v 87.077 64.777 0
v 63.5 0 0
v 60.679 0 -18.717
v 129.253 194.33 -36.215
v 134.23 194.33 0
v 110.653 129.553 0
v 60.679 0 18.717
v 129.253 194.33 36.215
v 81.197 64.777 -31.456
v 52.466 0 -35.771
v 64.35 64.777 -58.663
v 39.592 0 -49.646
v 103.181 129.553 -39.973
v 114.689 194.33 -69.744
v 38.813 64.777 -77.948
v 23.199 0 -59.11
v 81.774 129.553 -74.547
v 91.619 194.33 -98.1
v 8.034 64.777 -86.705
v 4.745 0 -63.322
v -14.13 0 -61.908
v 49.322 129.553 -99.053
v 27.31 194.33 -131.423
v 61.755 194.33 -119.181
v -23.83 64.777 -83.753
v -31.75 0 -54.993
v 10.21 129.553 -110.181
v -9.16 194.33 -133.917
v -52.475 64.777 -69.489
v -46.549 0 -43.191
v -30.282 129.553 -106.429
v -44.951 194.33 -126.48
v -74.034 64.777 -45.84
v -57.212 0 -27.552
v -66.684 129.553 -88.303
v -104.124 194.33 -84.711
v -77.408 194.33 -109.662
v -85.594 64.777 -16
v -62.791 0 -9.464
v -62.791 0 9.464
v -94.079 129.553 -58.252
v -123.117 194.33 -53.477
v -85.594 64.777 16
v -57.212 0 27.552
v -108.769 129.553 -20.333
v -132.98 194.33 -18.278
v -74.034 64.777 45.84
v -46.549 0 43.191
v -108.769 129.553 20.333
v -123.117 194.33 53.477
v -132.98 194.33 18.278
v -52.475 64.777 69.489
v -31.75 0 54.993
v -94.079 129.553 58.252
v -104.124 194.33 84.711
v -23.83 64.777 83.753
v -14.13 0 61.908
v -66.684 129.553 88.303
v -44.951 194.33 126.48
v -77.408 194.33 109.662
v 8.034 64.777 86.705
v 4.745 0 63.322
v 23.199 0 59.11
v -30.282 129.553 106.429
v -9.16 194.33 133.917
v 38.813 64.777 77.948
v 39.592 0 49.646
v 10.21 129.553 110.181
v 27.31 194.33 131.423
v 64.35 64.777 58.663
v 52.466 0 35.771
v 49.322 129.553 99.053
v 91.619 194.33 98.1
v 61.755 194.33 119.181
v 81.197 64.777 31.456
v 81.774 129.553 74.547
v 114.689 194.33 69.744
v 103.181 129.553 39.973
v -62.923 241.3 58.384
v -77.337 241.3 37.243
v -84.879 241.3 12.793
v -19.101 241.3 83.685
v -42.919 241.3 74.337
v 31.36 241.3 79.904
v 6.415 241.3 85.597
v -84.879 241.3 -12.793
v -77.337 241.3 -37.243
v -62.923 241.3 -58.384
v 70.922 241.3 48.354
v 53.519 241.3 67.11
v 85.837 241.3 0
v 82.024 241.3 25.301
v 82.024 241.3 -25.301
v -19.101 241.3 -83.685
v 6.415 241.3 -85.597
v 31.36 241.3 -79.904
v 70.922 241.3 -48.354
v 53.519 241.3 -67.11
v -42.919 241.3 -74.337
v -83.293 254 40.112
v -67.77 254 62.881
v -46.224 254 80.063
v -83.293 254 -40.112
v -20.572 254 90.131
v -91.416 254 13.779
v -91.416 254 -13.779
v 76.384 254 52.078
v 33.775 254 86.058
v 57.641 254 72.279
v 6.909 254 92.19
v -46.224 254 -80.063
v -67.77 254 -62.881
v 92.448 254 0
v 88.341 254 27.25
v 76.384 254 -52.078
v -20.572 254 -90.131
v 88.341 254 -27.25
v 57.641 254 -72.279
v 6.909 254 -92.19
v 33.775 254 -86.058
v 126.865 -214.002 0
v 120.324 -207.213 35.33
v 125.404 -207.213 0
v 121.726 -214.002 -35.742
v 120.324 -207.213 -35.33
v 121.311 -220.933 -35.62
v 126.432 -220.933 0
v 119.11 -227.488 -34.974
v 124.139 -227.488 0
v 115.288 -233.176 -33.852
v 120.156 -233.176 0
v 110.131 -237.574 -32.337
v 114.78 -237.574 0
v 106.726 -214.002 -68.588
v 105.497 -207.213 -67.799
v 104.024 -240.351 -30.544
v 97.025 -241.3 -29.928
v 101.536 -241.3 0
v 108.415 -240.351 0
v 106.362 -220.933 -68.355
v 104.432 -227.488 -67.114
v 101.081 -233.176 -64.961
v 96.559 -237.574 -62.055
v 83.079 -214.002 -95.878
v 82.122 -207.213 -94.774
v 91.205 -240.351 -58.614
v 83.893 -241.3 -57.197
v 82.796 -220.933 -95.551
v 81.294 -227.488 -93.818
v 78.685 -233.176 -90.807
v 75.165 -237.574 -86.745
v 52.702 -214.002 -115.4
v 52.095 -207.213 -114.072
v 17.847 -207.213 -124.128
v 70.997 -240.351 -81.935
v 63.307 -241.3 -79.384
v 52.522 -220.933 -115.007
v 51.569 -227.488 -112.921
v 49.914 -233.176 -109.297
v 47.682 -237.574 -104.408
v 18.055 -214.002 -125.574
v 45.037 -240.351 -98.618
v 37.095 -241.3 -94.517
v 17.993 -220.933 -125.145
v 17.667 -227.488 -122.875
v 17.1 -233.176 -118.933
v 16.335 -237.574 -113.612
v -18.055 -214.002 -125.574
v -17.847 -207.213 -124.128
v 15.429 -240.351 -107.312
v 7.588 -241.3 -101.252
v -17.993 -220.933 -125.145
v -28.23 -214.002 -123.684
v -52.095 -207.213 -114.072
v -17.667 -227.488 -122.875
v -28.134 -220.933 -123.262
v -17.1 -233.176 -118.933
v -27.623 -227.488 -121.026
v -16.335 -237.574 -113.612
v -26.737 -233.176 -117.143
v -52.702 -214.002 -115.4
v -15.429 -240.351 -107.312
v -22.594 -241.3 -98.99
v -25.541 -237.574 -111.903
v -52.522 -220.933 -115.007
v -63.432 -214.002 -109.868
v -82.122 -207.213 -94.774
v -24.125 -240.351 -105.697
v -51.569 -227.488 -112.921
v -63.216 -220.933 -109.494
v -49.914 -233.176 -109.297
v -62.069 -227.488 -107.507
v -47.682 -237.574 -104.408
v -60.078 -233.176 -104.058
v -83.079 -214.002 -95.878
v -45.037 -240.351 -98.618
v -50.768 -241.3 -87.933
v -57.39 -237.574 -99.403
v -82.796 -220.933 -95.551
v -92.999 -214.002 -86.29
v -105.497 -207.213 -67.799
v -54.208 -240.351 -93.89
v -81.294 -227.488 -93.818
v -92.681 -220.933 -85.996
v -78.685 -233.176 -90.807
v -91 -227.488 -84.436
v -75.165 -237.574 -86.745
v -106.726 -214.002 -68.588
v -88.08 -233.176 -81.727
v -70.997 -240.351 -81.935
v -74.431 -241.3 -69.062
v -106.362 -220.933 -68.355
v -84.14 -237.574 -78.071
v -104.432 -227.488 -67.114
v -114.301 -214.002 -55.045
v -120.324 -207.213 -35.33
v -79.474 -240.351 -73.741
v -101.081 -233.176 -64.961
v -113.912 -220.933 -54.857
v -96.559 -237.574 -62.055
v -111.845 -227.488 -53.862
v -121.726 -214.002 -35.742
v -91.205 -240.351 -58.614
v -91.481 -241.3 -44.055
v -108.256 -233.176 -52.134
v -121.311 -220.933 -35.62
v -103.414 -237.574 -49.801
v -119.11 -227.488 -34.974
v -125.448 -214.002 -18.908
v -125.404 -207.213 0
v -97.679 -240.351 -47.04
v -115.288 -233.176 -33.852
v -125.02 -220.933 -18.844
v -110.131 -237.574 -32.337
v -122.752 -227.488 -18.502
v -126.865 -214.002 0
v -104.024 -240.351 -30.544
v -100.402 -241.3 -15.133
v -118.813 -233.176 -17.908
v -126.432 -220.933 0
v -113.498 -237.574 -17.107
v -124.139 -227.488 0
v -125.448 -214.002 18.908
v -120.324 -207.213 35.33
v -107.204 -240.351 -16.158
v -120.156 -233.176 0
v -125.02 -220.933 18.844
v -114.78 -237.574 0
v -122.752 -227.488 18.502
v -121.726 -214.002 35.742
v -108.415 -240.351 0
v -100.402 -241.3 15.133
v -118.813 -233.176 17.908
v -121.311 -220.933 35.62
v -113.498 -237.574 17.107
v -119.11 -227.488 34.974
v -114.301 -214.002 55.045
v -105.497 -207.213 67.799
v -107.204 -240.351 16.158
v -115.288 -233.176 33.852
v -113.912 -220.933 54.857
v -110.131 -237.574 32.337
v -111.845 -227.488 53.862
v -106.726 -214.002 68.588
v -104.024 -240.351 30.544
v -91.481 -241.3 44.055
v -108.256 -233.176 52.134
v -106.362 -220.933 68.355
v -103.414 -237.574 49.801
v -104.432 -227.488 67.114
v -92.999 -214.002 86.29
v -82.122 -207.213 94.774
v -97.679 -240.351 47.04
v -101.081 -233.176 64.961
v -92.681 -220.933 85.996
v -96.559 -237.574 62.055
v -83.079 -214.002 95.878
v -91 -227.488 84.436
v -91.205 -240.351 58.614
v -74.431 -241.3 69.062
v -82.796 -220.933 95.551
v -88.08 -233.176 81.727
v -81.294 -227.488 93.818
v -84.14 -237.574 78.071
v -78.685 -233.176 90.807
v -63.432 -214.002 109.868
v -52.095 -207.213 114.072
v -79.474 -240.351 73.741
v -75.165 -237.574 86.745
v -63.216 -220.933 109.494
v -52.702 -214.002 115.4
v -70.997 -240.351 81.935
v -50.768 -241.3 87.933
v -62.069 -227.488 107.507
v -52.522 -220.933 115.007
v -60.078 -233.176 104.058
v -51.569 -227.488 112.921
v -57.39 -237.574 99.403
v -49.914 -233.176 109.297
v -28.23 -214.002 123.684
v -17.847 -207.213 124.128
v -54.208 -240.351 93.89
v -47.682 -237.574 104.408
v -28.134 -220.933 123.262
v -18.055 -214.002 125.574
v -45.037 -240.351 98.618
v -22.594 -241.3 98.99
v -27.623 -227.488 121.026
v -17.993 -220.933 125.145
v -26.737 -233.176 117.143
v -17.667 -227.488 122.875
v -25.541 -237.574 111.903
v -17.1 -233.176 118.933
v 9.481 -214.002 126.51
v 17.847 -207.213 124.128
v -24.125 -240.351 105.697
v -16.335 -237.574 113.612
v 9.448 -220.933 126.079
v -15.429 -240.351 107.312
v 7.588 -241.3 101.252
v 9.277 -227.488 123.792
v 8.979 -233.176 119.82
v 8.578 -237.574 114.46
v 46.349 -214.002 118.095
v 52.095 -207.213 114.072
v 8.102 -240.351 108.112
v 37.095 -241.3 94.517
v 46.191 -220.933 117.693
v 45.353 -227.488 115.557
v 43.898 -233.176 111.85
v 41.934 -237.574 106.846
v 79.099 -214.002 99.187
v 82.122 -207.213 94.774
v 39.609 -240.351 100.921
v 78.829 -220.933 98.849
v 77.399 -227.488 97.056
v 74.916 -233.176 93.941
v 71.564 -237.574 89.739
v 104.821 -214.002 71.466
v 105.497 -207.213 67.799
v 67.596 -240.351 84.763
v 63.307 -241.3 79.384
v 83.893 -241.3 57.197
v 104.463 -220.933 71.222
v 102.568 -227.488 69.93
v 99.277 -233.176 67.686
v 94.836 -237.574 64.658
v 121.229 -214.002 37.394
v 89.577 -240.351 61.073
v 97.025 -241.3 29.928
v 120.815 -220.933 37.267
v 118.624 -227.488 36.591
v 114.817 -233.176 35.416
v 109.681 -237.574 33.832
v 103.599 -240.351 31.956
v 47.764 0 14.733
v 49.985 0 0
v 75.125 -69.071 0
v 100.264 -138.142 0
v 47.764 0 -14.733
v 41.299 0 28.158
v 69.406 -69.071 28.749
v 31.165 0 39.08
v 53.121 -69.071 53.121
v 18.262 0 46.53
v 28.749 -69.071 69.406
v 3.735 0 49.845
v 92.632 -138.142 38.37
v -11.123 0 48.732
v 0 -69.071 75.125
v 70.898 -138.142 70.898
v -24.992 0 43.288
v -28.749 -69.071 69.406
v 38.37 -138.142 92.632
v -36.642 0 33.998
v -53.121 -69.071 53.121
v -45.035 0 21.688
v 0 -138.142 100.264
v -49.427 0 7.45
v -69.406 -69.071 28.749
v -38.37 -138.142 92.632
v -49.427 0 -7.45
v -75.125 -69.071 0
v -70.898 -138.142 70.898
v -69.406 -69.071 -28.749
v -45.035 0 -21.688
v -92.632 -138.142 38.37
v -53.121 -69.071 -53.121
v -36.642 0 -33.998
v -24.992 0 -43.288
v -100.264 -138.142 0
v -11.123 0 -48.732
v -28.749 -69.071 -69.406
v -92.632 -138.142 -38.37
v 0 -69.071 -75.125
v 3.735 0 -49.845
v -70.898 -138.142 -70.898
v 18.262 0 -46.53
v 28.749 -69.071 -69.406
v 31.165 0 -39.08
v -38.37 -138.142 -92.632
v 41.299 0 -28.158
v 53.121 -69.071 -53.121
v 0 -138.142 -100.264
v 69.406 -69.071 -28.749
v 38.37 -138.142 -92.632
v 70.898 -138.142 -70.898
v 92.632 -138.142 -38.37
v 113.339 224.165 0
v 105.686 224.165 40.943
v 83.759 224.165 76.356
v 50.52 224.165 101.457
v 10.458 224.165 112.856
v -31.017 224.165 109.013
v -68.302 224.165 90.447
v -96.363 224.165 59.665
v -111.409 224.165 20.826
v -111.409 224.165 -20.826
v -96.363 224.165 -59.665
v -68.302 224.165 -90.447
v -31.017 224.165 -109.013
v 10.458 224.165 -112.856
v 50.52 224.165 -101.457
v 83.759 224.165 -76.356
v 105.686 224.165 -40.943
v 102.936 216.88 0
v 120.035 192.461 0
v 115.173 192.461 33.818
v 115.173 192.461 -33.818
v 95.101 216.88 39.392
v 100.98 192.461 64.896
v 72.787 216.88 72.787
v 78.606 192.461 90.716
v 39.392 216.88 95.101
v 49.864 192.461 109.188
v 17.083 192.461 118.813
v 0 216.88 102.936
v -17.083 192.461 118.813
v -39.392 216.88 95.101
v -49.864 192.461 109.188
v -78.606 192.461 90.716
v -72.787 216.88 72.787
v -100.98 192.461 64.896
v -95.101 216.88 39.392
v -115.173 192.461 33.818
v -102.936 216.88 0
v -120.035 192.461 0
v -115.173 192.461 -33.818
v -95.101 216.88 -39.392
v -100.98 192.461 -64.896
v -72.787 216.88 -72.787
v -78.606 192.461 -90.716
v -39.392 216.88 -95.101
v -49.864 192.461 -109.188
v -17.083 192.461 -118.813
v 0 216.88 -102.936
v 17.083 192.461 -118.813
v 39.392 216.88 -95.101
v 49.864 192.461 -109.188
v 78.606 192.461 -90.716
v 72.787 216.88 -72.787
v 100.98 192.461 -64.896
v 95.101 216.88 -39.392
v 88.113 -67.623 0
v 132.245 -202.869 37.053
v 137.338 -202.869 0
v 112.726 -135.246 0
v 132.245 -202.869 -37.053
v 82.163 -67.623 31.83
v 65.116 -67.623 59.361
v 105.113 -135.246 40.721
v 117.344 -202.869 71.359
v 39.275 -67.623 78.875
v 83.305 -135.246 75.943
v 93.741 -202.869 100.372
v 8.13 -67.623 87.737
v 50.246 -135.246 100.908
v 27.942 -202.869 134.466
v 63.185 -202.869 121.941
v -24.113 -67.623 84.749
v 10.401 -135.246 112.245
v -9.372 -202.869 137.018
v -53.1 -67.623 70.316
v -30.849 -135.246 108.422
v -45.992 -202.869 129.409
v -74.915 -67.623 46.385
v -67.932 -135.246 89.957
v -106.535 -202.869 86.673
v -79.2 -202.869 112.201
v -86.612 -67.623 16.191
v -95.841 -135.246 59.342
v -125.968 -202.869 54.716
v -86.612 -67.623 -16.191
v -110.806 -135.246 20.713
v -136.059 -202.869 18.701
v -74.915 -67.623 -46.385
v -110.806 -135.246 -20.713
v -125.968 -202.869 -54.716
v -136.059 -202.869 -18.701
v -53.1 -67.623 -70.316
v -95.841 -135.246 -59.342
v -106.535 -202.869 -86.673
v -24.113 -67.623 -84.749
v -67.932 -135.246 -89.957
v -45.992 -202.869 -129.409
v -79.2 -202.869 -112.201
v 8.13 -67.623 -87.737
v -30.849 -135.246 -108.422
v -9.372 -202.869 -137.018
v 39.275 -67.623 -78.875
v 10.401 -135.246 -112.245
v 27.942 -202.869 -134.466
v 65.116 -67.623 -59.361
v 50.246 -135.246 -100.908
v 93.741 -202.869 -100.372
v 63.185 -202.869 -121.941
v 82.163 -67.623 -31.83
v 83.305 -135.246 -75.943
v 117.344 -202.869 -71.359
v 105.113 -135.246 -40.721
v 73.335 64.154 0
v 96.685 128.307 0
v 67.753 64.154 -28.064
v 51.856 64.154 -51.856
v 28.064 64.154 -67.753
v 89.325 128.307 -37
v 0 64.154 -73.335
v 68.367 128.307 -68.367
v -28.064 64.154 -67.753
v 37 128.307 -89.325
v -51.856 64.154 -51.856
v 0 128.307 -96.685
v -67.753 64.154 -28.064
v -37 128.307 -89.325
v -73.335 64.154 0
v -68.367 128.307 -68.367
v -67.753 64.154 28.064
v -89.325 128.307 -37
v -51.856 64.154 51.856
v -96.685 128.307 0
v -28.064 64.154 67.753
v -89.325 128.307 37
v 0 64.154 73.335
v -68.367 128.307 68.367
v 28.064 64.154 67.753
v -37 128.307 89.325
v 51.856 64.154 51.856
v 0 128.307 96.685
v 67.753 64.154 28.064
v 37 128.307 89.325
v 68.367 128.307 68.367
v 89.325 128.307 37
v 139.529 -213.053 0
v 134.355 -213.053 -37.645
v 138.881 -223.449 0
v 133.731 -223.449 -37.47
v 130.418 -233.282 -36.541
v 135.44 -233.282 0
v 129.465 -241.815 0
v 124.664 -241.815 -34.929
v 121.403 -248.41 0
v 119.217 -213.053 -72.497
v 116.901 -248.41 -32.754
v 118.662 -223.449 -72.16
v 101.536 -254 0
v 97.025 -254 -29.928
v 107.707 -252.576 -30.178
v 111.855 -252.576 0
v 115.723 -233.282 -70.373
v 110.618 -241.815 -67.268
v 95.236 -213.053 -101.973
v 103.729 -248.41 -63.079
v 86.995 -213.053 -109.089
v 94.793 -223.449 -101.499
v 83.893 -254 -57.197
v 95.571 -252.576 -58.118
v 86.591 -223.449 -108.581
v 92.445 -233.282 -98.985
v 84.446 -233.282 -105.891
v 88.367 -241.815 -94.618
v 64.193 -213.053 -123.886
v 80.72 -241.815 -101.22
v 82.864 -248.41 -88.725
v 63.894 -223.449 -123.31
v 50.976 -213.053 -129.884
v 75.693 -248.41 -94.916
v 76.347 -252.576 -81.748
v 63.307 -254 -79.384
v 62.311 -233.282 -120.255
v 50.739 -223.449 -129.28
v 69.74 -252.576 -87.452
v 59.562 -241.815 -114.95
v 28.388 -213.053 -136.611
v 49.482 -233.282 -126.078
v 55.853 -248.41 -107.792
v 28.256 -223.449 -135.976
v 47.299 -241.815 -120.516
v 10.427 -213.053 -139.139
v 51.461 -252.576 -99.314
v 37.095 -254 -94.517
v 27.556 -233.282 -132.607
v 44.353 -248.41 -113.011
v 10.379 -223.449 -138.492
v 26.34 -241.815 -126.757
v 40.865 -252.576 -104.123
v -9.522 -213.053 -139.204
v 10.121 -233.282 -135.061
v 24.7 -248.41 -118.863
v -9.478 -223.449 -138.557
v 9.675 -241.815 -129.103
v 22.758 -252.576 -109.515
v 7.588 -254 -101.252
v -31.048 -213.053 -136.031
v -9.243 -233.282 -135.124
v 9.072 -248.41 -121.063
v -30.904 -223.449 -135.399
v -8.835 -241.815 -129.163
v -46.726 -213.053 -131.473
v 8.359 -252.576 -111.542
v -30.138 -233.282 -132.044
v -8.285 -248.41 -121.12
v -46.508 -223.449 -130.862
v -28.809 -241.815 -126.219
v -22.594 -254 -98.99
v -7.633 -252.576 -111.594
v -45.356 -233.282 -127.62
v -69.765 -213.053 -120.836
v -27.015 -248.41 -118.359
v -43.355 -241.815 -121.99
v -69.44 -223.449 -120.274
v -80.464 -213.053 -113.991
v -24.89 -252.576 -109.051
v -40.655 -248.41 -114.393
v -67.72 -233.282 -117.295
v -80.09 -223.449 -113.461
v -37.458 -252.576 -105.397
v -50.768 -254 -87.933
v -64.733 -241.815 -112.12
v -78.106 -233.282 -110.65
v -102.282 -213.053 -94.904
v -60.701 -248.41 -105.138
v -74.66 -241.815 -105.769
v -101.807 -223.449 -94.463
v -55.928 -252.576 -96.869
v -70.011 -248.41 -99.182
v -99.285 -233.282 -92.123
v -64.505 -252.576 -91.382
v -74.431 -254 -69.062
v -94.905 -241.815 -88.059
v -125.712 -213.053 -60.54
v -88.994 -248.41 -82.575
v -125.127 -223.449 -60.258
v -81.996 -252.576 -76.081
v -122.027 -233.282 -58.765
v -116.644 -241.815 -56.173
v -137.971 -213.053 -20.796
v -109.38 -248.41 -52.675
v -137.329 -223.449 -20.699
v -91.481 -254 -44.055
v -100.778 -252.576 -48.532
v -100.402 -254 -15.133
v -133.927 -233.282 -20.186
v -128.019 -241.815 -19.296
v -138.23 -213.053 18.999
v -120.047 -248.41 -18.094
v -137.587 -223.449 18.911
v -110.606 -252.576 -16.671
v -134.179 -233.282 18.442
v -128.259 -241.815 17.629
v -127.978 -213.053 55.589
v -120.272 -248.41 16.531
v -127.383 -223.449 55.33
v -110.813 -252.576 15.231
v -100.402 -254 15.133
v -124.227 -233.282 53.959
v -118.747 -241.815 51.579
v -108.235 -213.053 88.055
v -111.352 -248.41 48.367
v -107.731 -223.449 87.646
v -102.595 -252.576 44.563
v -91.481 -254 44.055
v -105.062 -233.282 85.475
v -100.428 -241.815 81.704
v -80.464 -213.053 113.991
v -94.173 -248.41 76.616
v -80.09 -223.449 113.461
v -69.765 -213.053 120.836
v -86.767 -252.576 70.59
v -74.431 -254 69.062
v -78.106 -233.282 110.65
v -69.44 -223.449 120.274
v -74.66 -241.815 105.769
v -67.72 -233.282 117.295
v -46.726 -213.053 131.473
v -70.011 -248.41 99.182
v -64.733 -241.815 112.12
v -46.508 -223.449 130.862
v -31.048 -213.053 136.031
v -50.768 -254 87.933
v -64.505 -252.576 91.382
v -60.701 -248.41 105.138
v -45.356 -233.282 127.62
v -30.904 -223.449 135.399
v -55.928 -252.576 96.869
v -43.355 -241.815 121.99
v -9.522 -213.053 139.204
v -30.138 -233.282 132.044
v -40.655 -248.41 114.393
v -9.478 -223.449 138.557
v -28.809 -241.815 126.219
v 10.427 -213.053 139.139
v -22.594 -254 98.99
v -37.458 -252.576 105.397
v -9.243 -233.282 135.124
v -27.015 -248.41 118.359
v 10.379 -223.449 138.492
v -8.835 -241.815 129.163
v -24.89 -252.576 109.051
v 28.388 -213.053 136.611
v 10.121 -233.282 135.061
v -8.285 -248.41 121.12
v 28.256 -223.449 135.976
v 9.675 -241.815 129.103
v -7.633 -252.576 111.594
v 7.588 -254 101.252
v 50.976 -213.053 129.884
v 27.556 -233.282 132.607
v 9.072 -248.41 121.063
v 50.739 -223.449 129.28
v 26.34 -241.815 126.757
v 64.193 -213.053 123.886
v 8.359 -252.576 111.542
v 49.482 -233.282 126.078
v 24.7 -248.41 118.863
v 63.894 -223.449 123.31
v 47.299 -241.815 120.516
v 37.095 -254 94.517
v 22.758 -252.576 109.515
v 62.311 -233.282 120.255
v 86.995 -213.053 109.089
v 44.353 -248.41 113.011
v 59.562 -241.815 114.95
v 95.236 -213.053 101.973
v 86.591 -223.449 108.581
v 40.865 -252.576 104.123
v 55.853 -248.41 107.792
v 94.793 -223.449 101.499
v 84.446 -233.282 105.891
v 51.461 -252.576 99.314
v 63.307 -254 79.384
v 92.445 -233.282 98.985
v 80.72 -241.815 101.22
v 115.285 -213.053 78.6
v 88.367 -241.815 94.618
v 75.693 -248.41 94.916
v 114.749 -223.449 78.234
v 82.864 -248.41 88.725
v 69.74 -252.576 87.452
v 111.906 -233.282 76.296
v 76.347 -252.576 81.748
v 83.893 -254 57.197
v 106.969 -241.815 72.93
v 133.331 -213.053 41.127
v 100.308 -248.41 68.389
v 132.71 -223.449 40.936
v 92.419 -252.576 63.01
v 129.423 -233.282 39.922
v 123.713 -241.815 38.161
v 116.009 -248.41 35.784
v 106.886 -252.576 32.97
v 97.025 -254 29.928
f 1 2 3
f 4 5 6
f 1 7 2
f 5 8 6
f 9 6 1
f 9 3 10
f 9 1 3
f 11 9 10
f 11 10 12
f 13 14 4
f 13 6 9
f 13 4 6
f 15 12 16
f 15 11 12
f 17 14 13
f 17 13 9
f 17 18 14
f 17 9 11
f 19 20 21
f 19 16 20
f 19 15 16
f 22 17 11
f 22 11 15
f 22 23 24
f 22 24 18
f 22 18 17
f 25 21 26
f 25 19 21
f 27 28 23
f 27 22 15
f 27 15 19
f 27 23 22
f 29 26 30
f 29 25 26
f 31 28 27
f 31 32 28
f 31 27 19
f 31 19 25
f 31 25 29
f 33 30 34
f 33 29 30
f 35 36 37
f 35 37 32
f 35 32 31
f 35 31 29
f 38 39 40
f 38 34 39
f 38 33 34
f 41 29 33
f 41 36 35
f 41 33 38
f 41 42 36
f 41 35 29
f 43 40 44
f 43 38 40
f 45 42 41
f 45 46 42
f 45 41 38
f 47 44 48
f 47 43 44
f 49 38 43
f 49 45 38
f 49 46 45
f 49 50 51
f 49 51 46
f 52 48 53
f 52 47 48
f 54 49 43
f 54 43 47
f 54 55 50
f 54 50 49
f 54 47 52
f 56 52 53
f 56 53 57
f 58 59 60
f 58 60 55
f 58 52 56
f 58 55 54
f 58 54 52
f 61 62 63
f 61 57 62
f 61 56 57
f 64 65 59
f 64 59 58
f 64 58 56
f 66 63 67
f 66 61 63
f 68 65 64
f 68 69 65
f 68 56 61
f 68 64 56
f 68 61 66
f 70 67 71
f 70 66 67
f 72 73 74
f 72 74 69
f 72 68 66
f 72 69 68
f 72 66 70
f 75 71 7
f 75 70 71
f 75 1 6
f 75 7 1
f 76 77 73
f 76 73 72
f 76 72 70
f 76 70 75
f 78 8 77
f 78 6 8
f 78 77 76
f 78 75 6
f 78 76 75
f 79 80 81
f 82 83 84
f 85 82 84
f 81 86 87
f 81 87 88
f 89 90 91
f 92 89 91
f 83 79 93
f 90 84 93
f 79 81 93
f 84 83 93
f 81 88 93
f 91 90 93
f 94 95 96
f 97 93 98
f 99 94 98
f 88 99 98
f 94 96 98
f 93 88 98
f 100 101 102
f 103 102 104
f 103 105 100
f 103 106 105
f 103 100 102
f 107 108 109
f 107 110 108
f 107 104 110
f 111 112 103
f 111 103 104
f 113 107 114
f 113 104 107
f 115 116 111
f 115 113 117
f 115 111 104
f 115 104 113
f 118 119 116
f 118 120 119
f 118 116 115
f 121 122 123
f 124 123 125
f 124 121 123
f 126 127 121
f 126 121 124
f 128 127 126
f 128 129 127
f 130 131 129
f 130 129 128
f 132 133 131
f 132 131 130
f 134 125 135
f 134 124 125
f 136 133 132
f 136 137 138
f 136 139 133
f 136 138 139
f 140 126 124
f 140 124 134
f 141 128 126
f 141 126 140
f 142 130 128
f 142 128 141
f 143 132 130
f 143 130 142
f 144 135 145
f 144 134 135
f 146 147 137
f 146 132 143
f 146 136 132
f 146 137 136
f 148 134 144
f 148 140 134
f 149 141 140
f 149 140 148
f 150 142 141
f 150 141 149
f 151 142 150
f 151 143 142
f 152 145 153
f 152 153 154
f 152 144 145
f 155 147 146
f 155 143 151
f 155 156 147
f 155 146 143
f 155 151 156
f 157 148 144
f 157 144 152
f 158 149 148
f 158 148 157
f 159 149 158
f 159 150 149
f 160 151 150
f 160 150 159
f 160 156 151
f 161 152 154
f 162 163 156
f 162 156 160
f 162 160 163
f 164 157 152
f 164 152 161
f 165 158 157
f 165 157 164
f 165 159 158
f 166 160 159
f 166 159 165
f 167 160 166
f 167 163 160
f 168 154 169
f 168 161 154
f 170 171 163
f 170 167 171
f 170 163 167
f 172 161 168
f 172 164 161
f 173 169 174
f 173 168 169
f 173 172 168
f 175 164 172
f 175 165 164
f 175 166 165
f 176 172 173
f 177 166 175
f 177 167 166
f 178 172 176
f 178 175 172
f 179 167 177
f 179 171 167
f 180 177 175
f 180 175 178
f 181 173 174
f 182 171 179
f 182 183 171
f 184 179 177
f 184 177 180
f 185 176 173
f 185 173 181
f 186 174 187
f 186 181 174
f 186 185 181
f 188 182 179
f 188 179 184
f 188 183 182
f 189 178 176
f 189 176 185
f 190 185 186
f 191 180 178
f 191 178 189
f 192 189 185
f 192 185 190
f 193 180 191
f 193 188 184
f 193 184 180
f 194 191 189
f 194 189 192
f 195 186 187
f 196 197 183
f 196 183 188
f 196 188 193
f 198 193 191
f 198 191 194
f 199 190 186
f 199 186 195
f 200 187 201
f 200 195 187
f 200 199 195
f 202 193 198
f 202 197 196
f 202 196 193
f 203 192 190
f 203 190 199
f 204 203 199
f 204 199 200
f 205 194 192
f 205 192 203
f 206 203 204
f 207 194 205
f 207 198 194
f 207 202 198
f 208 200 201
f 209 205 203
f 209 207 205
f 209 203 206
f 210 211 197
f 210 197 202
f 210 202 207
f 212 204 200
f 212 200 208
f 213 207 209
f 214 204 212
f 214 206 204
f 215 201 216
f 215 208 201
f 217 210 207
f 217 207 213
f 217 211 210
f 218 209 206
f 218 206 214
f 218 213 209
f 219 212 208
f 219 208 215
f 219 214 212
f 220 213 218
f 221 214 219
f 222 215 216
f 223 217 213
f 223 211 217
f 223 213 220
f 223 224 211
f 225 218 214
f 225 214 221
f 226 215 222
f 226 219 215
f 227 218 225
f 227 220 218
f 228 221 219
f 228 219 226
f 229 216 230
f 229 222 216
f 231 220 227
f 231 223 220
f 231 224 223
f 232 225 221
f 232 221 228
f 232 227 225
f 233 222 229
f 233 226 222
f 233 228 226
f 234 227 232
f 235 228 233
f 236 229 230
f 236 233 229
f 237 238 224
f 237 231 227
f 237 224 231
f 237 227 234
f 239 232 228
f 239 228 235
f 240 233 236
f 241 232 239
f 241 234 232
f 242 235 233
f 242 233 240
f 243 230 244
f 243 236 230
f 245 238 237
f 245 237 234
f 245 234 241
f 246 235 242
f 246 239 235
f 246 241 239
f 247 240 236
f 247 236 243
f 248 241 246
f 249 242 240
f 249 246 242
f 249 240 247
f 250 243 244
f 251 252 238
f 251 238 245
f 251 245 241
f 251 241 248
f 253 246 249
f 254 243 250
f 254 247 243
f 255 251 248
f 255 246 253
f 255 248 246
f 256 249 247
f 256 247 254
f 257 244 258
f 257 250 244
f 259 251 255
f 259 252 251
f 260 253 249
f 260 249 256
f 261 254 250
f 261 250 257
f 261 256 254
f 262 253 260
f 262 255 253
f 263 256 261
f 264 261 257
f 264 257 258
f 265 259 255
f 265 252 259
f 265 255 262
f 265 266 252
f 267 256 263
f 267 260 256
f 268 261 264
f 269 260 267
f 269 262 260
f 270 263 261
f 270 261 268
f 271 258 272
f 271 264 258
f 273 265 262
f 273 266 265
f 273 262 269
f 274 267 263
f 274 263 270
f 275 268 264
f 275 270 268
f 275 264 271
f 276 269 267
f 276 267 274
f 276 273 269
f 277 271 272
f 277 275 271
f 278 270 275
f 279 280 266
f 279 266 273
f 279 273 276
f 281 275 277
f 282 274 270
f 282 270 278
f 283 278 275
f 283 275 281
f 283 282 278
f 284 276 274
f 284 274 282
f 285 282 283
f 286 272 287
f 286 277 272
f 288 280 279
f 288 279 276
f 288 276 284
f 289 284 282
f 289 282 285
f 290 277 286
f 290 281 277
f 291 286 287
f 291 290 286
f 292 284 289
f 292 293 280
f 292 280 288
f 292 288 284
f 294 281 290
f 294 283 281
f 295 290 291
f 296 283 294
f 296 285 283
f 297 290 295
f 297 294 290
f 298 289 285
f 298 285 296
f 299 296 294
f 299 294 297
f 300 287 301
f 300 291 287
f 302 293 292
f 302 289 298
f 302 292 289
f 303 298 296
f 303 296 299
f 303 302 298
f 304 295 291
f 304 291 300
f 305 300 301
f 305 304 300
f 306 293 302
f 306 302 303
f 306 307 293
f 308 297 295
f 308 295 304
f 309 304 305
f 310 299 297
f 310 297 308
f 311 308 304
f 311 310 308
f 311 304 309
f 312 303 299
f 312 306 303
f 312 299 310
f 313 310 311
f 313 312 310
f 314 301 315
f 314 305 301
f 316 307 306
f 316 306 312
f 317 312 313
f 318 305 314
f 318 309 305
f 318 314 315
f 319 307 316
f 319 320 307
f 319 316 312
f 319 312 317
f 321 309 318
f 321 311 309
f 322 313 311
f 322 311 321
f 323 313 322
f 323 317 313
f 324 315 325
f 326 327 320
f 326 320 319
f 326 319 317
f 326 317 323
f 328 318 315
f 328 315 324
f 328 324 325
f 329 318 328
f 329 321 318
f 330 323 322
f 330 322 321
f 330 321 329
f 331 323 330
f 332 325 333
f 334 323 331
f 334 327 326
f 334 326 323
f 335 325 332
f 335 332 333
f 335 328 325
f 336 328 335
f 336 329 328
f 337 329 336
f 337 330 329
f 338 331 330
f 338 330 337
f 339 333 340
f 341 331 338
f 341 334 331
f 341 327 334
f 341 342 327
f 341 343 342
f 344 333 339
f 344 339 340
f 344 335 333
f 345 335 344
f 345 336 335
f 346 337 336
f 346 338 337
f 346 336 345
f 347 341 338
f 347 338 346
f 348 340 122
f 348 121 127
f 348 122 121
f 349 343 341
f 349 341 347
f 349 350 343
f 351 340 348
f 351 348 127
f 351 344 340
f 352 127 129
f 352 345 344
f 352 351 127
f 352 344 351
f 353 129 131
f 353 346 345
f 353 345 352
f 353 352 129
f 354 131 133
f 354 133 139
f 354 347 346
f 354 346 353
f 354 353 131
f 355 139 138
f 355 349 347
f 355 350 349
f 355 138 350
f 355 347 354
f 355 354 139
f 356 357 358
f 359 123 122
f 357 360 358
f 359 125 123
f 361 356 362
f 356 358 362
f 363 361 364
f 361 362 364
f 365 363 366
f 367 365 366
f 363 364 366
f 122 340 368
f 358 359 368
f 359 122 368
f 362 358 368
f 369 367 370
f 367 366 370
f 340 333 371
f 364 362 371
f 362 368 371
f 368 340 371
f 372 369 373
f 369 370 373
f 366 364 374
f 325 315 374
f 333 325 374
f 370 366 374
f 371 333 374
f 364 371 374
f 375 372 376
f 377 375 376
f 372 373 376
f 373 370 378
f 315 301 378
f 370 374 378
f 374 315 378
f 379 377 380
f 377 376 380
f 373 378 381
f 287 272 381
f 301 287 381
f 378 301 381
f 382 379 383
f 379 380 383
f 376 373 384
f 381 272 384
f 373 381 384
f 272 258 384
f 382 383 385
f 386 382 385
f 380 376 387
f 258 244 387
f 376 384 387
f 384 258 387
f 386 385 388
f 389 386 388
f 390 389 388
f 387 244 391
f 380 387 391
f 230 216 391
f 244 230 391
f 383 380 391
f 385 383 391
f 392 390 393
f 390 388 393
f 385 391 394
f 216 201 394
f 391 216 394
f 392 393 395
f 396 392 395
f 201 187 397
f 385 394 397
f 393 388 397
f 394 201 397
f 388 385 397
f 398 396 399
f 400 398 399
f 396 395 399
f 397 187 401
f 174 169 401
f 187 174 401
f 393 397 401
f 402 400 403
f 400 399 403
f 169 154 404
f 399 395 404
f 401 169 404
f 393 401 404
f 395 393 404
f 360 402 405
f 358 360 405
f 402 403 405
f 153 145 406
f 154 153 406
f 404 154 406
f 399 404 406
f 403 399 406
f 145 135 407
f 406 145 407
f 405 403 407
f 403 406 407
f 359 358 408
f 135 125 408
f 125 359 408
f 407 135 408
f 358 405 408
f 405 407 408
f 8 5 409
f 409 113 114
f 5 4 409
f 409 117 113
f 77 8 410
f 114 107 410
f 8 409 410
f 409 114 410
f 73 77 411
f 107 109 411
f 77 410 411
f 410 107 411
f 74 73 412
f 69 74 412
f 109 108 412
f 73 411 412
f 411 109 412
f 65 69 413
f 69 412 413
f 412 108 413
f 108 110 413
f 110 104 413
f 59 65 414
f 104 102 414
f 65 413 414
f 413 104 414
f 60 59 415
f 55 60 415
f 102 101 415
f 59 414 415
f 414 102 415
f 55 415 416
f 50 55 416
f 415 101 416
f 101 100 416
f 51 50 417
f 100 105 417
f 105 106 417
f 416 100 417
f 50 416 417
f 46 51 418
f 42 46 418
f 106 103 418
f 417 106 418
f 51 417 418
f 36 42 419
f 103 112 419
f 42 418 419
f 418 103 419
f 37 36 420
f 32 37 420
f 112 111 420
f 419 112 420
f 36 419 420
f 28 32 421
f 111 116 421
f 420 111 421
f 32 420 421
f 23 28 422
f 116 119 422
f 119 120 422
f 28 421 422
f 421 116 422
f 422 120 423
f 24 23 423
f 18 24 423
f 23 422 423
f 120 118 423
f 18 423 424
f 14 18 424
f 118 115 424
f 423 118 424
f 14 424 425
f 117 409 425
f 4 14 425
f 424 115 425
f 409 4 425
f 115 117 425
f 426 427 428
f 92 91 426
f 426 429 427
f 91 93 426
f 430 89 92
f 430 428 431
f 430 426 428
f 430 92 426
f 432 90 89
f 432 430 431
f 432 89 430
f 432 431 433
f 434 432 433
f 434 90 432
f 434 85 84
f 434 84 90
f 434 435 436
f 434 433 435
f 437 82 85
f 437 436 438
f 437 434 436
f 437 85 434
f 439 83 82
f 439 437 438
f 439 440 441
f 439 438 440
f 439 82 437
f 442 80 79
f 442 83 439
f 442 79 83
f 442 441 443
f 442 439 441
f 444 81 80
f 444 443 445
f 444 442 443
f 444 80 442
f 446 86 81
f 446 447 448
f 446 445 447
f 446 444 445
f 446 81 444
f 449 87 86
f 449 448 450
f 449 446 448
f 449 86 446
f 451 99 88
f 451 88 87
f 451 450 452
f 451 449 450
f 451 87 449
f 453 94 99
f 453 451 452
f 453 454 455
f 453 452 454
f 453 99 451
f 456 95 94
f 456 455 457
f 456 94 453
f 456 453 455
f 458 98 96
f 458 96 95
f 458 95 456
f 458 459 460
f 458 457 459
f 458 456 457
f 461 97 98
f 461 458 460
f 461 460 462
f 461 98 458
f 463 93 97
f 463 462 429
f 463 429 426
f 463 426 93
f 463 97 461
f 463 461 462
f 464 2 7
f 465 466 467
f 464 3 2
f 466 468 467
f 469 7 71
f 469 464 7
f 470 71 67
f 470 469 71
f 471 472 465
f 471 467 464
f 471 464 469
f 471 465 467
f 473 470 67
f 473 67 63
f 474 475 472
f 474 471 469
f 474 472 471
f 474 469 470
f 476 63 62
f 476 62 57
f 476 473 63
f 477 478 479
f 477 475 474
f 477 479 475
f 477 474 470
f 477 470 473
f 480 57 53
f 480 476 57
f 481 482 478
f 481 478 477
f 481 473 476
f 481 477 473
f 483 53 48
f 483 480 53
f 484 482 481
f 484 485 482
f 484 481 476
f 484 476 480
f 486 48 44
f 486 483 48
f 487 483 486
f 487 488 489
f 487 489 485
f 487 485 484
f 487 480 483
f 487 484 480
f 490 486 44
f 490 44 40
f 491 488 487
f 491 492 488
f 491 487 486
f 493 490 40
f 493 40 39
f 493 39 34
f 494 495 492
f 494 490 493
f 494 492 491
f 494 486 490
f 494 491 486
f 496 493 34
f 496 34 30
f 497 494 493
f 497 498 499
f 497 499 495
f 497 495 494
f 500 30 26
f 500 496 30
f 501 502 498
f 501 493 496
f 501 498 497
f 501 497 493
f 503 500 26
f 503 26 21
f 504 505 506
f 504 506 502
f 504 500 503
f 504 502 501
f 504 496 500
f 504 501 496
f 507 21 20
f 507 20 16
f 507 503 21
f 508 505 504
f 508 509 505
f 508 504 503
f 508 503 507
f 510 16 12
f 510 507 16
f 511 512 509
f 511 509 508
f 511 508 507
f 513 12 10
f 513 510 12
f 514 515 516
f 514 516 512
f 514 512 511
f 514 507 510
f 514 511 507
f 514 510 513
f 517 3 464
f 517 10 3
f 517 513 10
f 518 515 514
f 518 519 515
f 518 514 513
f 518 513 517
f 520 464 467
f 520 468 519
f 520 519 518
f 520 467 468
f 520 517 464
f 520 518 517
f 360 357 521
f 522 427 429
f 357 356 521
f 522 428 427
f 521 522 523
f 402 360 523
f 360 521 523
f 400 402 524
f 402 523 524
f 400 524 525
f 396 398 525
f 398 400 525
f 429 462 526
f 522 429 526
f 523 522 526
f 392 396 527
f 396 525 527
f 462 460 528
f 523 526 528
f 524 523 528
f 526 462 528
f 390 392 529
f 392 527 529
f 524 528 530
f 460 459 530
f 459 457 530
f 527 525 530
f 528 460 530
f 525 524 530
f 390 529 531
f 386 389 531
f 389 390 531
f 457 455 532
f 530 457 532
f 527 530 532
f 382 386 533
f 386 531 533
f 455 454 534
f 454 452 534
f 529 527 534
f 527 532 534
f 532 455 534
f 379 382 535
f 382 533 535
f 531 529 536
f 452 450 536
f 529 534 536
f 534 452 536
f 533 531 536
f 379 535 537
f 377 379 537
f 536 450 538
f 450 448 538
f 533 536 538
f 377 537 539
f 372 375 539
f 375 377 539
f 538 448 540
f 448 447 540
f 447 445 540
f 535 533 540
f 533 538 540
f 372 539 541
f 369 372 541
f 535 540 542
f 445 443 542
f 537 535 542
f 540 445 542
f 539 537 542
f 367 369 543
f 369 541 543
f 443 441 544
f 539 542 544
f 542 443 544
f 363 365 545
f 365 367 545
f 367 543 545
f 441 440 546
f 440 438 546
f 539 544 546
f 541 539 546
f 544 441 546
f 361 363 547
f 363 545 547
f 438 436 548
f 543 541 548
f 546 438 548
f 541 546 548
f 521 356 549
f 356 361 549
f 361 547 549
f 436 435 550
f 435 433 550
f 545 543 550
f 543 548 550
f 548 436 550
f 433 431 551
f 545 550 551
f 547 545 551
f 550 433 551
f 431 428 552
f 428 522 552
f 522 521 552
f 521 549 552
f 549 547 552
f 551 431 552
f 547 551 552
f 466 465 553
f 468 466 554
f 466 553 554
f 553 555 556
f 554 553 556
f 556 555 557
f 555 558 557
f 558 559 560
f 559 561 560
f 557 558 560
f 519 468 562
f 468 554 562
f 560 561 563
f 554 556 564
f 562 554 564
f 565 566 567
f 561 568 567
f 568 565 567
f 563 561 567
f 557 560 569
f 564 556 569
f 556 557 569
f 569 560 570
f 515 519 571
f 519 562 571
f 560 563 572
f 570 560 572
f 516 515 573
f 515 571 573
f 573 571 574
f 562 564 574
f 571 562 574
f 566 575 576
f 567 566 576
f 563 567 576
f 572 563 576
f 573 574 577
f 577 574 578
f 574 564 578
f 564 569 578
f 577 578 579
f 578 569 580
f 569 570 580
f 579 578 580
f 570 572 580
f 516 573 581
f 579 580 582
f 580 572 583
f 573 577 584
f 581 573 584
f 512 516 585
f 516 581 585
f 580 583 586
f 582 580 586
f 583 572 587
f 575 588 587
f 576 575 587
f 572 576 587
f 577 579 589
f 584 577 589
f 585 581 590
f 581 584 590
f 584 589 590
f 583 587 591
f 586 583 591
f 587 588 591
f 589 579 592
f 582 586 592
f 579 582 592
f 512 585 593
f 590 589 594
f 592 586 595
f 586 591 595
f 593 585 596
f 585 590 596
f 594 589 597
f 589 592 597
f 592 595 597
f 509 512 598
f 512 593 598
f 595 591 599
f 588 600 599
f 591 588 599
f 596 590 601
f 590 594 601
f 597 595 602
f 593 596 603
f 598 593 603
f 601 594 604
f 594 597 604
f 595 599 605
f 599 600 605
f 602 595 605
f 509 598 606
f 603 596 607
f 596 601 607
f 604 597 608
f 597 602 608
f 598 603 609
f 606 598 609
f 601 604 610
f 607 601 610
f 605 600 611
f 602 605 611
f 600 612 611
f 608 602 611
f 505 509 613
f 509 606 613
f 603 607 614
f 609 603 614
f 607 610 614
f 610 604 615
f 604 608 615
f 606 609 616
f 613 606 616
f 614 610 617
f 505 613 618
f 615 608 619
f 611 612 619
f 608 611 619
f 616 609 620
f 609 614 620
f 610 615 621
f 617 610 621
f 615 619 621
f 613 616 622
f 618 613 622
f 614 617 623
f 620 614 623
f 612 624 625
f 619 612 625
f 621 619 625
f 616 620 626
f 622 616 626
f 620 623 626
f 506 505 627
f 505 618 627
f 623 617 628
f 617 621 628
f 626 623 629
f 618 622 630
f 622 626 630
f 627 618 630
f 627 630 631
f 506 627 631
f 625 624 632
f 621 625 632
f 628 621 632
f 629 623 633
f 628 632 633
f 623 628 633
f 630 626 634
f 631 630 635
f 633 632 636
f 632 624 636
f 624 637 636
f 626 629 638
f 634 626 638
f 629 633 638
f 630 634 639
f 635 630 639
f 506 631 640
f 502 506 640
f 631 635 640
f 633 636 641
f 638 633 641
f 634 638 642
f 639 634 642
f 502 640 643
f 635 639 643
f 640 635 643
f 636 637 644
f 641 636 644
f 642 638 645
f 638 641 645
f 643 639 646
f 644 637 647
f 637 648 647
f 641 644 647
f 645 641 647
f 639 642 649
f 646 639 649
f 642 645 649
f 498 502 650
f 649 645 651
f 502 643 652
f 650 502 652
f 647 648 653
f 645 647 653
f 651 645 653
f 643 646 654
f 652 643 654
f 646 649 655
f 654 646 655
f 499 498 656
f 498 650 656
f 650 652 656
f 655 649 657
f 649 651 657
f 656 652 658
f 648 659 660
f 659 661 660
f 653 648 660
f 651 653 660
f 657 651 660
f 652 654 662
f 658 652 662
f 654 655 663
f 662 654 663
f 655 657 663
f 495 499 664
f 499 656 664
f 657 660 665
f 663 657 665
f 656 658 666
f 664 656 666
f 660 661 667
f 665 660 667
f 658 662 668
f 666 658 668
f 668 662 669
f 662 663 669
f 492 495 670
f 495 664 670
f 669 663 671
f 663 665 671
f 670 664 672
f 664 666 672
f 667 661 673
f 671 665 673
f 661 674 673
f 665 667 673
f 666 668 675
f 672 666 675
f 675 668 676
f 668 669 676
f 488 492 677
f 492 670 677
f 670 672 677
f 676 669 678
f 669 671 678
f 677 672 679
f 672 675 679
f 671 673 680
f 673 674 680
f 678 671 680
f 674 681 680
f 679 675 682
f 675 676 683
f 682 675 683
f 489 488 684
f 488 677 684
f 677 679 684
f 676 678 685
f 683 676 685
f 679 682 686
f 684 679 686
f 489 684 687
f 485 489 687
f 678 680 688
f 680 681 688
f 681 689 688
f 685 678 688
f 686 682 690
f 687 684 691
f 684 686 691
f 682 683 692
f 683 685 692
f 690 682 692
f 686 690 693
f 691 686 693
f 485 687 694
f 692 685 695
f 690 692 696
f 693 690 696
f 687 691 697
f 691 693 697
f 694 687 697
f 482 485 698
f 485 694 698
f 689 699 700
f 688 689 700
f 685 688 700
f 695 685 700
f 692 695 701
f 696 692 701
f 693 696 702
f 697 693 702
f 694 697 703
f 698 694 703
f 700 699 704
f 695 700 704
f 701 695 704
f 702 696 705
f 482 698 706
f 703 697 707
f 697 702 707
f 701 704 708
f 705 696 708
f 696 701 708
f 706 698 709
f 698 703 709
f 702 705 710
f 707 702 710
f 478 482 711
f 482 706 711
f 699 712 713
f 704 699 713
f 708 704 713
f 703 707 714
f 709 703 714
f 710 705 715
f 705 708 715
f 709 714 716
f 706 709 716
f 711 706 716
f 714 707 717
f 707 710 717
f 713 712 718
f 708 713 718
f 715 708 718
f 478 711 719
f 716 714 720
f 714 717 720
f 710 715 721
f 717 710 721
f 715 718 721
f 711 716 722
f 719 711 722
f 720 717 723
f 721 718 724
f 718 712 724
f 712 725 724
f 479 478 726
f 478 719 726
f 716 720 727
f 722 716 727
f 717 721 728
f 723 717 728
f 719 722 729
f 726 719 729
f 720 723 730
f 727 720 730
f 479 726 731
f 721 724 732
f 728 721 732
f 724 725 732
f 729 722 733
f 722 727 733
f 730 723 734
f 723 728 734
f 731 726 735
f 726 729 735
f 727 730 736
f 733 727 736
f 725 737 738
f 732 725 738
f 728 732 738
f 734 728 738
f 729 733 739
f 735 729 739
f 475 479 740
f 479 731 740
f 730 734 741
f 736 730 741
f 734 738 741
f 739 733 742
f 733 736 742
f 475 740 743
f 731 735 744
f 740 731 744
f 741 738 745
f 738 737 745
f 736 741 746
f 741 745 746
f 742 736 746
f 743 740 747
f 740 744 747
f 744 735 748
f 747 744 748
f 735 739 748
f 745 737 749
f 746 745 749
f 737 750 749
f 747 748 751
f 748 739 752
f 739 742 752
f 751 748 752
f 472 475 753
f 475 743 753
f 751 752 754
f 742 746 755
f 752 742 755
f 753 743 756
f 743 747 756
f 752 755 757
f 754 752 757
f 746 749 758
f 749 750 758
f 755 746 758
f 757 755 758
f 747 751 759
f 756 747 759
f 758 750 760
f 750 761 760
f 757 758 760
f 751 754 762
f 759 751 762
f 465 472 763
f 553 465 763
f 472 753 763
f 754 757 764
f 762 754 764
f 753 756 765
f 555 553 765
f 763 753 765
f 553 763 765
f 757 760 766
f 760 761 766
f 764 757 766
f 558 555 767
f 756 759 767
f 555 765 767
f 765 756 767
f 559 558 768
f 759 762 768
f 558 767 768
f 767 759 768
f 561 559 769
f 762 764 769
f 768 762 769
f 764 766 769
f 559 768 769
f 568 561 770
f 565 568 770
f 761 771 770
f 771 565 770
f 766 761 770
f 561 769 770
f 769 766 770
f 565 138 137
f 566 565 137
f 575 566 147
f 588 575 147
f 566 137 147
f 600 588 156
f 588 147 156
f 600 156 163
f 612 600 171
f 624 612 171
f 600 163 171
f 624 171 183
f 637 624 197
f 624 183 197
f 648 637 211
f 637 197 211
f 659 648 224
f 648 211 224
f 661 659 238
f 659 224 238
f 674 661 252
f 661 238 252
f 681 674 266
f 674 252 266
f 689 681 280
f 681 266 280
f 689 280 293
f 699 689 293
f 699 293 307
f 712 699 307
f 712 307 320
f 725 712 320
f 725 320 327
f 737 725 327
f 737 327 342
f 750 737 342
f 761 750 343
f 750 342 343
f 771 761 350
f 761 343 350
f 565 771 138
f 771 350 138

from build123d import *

# Parameters (mm, degrees)
F0_R      = 63.5
F1_DEPTH  = 254
F1_TAPER  = -20
F1_FACE_R = 63.5
F2_DEPTH  = 254
F2_TAPER  = -20
F3_R      = 38.1
F5_T      = -12.7


# Not quite as in the source:
# - a fillet or chamfer that OpenCascade refuses, or shapes differently, is made with other operations: its cross-section is extruded or revolved along the edge and cut away or added
# - a shell that OpenCascade refuses in one call is made with other operations: the cavity is built on its own and cut out


with BuildPart() as f1:
    # F0 (on Front) → F1 (new body)
    with BuildSketch(Plane.XZ):
        Circle(F0_R)
    extrude(amount=F1_DEPTH, taper=F1_TAPER)

    # F1_face (on face) → F2 (join)
    with BuildSketch(Plane(origin=(0, 0, 0), x_dir=(1, 0, 0), z_dir=(0, 1, 0))):
        Circle(F1_FACE_R)
    extrude(amount=F2_DEPTH, taper=F2_TAPER)

    # F3
    f3_edges = [f1.edges().sort_by_distance(p)[0] for p in [
        (-155.94844, -254, 0),
    ]]
    fillet(f3_edges, radius=F3_R)

    # F4: chamfer of 63.5 on 1 edges, made by hand

    # F4_s1 → F4_t2 (revolve, cut)
    with BuildSketch(Plane.XY):
        Polygon((134.2301604024, 194.3295185801), (92.4484395036, 254), (155.9484395036, 254), align=None)
    revolve(axis=Axis((0, 254, 0), (0, -1, 0)), mode=Mode.SUBTRACT)

    # F5: a shell. OpenCascade refuses it in one call, so the cavity is built on its own and cut out:
    # the body offset inwards by the wall thickness, plus a prism from it out through each open face.
    f5_core = offset(f1.part, amount=F5_T, kind=Kind.INTERSECTION, mode=Mode.PRIVATE)
    f5_exits = [f5_core.faces().sort_by_distance(p)[0] for p in [
        (0, -241.3, 0),
    ]]
    add(f5_core, mode=Mode.SUBTRACT)
    extrude(f5_exits, amount=-F5_T, mode=Mode.SUBTRACT)


solid = f1.part
